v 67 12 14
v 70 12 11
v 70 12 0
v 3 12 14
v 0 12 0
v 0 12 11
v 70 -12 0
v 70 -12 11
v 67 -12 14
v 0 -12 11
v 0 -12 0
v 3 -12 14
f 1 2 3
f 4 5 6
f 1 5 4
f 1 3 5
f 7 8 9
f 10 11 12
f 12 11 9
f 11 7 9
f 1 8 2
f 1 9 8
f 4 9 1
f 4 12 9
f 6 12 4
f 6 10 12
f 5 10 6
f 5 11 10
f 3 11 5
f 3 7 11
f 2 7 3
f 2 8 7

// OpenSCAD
// Beam experiment: build the elephant-foot hull FROM an already chamfered beam.
//
// The important construction order is:
//
//   1. Build the normal cs chamfer first.
//   2. Use that already-chamfered upper solid as one input to the ef hull.
//   3. Use an ef-inset bottom footprint as the other input.
//   4. hull() those two.
//
// This avoids feeding a square upper block into the ef hull.

/* [Demo] */
scene = "00_plain"; // [00_plain, 01_cs_inputs, 02_cs_result, 03_ef_inputs, 04_combined_result, 05_corner]

/* [Geometry] */
length = 70;
width = 24;
height = 14;
c = 3;
cs = 3;
ef = 1.2;

/* [Hidden] */
eps = 0.02;
reach = 12;
$fn = 48;

// ---------- Base beam ----------

module beam_profile_2d() {
    polygon([
        [0, 0],
        [length, 0],
        [length, height - c],
        [length - c, height],
        [c, height],
        [0, height - c]
    ]);
}

module beam() {
    rotate([90, 0, 0])
        linear_extrude(height = width, center = true)
            beam_profile_2d();
}

// ---------- cs hull ----------

// Extend below z=0 so cs changes the side/end edges but leaves the bottom
// contact perimeter available for the separate ef construction.
module cs_outline_2d() {
    polygon([
        [0, -reach],
        [length, -reach],
        [length, height - c],
        [length - c, height],
        [c, height],
        [0, height - c]
    ]);
}

// cs INPUT 1: full outline, narrower across Y.
module cs_input_inner() {
    rotate([90, 0, 0])
        linear_extrude(height = width - 2 * cs, center = true)
            cs_outline_2d();
}

// cs INPUT 2: inset outline, full width across Y.
module cs_input_outer() {
    rotate([90, 0, 0])
        linear_extrude(height = width, center = true)
            offset(delta = -cs)
                cs_outline_2d();
}

module cs_hull() {
    hull() {
        cs_input_inner();
        cs_input_outer();
    }
}

module cs_body() {
    intersection() {
        beam();
        cs_hull();
    }
}

// ---------- ef hull built from the ALREADY chamfered body ----------

// INPUT 1 for ef:
// the bottom footprint is inset by ef around the complete perimeter.
module ef_input_bottom() {
    translate([ef, -width / 2 + ef, 0])
        cube([length - 2 * ef, width - 2 * ef, eps]);
}

// INPUT 2 for ef:
// NOT a square block.
//
// Start from cs_body(), which already contains the side-face chamfer and the
// upper end chamfers, and keep only the solid from z=ef upward.
// This is the upper object fed to the ef hull.
module ef_input_upper_chamfered() {
    intersection() {
        cs_body();
        translate([-reach, -width, ef])
            cube([length + 2 * reach, width * 2, height + reach]);
    }
}

// The final construction is now one hull from the ef-inset bottom footprint
// to the already-chamfered upper body.
module combined_hull() {
    hull() {
        ef_input_bottom();
        ef_input_upper_chamfered();
    }
}

// Keep the result within the original real beam.
// No separate cs_hull/ef_hull intersection is used after this point.
module combined_body() {
    intersection() {
        beam();
        combined_hull();
    }
}

module corner_crop() {
    translate([length - cs - ef - 4, width / 2 - cs - ef - 4, -1])
        cube([cs + ef + 8, cs + ef + 8, cs + ef + 5]);
}

// ---------- scenes ----------

if (scene == "00_plain") {
    color("SteelBlue")
        beam();
}

else if (scene == "01_cs_inputs") {
    color("SteelBlue", 0.36)
        cs_input_inner();
    color("DarkOrange", 0.36)
        cs_input_outer();
}

else if (scene == "02_cs_result") {
    color("SteelBlue")
        cs_body();
}

else if (scene == "03_ef_inputs") {
    // Blue: ef-inset bottom footprint.
    color("SteelBlue", 0.42)
        ef_input_bottom();

    // Orange: the ALREADY cs-chamfered upper solid.
    color("DarkOrange", 0.28)
        ef_input_upper_chamfered();
}

else if (scene == "04_combined_result") {
    color("SteelBlue")
        combined_body();
}

else {
    color("DarkOrange")
        intersection() {
            combined_body();
            corner_crop();
        }
}
